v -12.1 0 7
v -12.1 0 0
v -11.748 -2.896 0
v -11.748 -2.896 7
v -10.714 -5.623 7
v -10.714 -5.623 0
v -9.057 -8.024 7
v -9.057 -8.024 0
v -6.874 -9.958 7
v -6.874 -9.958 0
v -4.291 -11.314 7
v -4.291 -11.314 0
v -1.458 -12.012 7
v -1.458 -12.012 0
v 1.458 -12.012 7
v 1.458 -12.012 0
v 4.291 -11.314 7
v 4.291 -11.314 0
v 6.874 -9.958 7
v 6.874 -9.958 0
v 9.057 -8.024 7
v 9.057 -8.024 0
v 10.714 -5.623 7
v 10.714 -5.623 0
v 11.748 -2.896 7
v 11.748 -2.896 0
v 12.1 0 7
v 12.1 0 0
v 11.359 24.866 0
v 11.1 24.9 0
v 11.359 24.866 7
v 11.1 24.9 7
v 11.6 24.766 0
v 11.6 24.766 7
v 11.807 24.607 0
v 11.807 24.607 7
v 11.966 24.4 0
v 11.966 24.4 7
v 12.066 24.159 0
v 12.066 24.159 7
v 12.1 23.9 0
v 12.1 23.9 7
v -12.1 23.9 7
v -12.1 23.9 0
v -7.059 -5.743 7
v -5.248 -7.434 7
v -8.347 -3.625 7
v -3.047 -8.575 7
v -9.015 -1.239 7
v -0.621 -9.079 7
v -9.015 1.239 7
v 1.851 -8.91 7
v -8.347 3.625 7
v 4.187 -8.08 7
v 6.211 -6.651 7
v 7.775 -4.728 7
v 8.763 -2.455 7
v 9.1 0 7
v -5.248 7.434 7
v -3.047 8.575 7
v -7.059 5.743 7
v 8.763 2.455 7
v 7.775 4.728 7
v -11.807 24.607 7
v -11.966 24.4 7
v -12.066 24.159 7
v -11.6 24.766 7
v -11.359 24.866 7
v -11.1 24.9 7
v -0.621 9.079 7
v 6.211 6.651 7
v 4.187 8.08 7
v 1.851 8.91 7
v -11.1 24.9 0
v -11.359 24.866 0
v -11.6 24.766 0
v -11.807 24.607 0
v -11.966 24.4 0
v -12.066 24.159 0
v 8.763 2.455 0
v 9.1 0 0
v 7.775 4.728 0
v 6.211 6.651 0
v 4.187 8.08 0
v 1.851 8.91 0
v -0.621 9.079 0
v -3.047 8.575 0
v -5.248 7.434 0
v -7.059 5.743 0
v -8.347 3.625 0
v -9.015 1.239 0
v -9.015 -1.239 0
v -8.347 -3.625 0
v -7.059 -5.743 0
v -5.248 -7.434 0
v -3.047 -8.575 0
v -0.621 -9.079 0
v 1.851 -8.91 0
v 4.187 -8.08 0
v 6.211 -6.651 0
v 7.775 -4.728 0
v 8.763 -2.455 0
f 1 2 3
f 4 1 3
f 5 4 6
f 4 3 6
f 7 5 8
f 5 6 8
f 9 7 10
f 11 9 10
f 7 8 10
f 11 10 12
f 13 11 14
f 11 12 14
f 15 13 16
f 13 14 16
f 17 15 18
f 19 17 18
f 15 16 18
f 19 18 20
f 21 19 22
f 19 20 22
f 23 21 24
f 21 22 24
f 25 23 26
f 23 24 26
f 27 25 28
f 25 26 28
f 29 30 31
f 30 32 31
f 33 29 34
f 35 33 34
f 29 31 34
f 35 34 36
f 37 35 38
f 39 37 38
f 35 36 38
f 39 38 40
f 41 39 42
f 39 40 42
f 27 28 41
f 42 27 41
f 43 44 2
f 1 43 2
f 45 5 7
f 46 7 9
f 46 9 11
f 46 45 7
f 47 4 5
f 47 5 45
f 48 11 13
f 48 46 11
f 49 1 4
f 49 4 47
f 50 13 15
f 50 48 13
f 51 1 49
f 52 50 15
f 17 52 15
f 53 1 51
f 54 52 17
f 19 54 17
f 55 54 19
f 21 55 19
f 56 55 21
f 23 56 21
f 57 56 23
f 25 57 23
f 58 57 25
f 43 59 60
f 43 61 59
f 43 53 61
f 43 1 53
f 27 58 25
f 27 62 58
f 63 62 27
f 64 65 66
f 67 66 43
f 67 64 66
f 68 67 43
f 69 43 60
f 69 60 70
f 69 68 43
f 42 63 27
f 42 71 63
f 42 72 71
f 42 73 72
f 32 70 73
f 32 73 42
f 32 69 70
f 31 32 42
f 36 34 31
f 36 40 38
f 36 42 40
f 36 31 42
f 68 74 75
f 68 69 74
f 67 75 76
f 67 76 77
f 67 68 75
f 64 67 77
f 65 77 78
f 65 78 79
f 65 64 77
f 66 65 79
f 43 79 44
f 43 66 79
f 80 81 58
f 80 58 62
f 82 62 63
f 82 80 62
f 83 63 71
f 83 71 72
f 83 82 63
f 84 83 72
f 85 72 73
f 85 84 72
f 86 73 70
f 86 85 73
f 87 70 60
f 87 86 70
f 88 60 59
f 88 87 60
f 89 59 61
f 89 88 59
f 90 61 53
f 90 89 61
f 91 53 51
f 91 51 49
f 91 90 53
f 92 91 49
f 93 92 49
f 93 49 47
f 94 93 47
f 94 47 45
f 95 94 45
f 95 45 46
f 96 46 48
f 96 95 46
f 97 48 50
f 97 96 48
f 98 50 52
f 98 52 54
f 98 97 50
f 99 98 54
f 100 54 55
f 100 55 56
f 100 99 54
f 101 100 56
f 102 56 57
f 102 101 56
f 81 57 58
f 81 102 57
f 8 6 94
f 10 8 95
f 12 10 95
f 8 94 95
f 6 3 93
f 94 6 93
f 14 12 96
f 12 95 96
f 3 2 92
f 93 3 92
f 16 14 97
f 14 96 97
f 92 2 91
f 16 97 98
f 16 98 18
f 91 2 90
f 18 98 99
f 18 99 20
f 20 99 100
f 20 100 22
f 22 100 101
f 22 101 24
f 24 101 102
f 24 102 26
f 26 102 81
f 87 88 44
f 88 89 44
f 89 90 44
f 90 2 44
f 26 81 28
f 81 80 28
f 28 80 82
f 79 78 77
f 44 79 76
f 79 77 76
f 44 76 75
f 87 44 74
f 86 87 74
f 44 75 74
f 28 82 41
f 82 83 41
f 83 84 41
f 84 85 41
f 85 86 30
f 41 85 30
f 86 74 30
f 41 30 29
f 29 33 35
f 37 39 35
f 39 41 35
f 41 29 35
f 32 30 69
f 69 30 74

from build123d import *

# Parameters (mm, degrees)
F0_R     = 9.1
F1_DEPTH = 7
F2_R     = 1
F3_R     = 1


with BuildPart() as f1:
    # F0 (on Top) → F1 (new body)
    with BuildSketch(Plane.XY):
        with BuildLine():
            ThreePointArc((-12.1, 0), (0, -12.1), (12.1, 0))
            ThreePointArc((12.1, 0), (0, 12.1), (-12.1, 0))
        make_face()
        Circle(F0_R, mode=Mode.SUBTRACT)
        with BuildLine():
            ThreePointArc((-12.1, 0), (0, 12.1), (12.1, 0))
            Line((12.1, 0), (12.1, 24.9))
            Line((12.1, 24.9), (-12.1, 24.9))
            Line((-12.1, 24.9), (-12.1, 0))
        make_face()
    extrude(amount=F1_DEPTH)

    # F2
    f2_edges = [f1.edges().sort_by_distance(p)[0] for p in [
        (-12.1, 24.9, 3.5),
    ]]
    fillet(f2_edges, radius=F2_R)

    # F3
    f3_edges = [f1.edges().sort_by_distance(p)[0] for p in [
        (12.1, 24.9, 3.5),
    ]]
    fillet(f3_edges, radius=F3_R)


solid = f1.part
